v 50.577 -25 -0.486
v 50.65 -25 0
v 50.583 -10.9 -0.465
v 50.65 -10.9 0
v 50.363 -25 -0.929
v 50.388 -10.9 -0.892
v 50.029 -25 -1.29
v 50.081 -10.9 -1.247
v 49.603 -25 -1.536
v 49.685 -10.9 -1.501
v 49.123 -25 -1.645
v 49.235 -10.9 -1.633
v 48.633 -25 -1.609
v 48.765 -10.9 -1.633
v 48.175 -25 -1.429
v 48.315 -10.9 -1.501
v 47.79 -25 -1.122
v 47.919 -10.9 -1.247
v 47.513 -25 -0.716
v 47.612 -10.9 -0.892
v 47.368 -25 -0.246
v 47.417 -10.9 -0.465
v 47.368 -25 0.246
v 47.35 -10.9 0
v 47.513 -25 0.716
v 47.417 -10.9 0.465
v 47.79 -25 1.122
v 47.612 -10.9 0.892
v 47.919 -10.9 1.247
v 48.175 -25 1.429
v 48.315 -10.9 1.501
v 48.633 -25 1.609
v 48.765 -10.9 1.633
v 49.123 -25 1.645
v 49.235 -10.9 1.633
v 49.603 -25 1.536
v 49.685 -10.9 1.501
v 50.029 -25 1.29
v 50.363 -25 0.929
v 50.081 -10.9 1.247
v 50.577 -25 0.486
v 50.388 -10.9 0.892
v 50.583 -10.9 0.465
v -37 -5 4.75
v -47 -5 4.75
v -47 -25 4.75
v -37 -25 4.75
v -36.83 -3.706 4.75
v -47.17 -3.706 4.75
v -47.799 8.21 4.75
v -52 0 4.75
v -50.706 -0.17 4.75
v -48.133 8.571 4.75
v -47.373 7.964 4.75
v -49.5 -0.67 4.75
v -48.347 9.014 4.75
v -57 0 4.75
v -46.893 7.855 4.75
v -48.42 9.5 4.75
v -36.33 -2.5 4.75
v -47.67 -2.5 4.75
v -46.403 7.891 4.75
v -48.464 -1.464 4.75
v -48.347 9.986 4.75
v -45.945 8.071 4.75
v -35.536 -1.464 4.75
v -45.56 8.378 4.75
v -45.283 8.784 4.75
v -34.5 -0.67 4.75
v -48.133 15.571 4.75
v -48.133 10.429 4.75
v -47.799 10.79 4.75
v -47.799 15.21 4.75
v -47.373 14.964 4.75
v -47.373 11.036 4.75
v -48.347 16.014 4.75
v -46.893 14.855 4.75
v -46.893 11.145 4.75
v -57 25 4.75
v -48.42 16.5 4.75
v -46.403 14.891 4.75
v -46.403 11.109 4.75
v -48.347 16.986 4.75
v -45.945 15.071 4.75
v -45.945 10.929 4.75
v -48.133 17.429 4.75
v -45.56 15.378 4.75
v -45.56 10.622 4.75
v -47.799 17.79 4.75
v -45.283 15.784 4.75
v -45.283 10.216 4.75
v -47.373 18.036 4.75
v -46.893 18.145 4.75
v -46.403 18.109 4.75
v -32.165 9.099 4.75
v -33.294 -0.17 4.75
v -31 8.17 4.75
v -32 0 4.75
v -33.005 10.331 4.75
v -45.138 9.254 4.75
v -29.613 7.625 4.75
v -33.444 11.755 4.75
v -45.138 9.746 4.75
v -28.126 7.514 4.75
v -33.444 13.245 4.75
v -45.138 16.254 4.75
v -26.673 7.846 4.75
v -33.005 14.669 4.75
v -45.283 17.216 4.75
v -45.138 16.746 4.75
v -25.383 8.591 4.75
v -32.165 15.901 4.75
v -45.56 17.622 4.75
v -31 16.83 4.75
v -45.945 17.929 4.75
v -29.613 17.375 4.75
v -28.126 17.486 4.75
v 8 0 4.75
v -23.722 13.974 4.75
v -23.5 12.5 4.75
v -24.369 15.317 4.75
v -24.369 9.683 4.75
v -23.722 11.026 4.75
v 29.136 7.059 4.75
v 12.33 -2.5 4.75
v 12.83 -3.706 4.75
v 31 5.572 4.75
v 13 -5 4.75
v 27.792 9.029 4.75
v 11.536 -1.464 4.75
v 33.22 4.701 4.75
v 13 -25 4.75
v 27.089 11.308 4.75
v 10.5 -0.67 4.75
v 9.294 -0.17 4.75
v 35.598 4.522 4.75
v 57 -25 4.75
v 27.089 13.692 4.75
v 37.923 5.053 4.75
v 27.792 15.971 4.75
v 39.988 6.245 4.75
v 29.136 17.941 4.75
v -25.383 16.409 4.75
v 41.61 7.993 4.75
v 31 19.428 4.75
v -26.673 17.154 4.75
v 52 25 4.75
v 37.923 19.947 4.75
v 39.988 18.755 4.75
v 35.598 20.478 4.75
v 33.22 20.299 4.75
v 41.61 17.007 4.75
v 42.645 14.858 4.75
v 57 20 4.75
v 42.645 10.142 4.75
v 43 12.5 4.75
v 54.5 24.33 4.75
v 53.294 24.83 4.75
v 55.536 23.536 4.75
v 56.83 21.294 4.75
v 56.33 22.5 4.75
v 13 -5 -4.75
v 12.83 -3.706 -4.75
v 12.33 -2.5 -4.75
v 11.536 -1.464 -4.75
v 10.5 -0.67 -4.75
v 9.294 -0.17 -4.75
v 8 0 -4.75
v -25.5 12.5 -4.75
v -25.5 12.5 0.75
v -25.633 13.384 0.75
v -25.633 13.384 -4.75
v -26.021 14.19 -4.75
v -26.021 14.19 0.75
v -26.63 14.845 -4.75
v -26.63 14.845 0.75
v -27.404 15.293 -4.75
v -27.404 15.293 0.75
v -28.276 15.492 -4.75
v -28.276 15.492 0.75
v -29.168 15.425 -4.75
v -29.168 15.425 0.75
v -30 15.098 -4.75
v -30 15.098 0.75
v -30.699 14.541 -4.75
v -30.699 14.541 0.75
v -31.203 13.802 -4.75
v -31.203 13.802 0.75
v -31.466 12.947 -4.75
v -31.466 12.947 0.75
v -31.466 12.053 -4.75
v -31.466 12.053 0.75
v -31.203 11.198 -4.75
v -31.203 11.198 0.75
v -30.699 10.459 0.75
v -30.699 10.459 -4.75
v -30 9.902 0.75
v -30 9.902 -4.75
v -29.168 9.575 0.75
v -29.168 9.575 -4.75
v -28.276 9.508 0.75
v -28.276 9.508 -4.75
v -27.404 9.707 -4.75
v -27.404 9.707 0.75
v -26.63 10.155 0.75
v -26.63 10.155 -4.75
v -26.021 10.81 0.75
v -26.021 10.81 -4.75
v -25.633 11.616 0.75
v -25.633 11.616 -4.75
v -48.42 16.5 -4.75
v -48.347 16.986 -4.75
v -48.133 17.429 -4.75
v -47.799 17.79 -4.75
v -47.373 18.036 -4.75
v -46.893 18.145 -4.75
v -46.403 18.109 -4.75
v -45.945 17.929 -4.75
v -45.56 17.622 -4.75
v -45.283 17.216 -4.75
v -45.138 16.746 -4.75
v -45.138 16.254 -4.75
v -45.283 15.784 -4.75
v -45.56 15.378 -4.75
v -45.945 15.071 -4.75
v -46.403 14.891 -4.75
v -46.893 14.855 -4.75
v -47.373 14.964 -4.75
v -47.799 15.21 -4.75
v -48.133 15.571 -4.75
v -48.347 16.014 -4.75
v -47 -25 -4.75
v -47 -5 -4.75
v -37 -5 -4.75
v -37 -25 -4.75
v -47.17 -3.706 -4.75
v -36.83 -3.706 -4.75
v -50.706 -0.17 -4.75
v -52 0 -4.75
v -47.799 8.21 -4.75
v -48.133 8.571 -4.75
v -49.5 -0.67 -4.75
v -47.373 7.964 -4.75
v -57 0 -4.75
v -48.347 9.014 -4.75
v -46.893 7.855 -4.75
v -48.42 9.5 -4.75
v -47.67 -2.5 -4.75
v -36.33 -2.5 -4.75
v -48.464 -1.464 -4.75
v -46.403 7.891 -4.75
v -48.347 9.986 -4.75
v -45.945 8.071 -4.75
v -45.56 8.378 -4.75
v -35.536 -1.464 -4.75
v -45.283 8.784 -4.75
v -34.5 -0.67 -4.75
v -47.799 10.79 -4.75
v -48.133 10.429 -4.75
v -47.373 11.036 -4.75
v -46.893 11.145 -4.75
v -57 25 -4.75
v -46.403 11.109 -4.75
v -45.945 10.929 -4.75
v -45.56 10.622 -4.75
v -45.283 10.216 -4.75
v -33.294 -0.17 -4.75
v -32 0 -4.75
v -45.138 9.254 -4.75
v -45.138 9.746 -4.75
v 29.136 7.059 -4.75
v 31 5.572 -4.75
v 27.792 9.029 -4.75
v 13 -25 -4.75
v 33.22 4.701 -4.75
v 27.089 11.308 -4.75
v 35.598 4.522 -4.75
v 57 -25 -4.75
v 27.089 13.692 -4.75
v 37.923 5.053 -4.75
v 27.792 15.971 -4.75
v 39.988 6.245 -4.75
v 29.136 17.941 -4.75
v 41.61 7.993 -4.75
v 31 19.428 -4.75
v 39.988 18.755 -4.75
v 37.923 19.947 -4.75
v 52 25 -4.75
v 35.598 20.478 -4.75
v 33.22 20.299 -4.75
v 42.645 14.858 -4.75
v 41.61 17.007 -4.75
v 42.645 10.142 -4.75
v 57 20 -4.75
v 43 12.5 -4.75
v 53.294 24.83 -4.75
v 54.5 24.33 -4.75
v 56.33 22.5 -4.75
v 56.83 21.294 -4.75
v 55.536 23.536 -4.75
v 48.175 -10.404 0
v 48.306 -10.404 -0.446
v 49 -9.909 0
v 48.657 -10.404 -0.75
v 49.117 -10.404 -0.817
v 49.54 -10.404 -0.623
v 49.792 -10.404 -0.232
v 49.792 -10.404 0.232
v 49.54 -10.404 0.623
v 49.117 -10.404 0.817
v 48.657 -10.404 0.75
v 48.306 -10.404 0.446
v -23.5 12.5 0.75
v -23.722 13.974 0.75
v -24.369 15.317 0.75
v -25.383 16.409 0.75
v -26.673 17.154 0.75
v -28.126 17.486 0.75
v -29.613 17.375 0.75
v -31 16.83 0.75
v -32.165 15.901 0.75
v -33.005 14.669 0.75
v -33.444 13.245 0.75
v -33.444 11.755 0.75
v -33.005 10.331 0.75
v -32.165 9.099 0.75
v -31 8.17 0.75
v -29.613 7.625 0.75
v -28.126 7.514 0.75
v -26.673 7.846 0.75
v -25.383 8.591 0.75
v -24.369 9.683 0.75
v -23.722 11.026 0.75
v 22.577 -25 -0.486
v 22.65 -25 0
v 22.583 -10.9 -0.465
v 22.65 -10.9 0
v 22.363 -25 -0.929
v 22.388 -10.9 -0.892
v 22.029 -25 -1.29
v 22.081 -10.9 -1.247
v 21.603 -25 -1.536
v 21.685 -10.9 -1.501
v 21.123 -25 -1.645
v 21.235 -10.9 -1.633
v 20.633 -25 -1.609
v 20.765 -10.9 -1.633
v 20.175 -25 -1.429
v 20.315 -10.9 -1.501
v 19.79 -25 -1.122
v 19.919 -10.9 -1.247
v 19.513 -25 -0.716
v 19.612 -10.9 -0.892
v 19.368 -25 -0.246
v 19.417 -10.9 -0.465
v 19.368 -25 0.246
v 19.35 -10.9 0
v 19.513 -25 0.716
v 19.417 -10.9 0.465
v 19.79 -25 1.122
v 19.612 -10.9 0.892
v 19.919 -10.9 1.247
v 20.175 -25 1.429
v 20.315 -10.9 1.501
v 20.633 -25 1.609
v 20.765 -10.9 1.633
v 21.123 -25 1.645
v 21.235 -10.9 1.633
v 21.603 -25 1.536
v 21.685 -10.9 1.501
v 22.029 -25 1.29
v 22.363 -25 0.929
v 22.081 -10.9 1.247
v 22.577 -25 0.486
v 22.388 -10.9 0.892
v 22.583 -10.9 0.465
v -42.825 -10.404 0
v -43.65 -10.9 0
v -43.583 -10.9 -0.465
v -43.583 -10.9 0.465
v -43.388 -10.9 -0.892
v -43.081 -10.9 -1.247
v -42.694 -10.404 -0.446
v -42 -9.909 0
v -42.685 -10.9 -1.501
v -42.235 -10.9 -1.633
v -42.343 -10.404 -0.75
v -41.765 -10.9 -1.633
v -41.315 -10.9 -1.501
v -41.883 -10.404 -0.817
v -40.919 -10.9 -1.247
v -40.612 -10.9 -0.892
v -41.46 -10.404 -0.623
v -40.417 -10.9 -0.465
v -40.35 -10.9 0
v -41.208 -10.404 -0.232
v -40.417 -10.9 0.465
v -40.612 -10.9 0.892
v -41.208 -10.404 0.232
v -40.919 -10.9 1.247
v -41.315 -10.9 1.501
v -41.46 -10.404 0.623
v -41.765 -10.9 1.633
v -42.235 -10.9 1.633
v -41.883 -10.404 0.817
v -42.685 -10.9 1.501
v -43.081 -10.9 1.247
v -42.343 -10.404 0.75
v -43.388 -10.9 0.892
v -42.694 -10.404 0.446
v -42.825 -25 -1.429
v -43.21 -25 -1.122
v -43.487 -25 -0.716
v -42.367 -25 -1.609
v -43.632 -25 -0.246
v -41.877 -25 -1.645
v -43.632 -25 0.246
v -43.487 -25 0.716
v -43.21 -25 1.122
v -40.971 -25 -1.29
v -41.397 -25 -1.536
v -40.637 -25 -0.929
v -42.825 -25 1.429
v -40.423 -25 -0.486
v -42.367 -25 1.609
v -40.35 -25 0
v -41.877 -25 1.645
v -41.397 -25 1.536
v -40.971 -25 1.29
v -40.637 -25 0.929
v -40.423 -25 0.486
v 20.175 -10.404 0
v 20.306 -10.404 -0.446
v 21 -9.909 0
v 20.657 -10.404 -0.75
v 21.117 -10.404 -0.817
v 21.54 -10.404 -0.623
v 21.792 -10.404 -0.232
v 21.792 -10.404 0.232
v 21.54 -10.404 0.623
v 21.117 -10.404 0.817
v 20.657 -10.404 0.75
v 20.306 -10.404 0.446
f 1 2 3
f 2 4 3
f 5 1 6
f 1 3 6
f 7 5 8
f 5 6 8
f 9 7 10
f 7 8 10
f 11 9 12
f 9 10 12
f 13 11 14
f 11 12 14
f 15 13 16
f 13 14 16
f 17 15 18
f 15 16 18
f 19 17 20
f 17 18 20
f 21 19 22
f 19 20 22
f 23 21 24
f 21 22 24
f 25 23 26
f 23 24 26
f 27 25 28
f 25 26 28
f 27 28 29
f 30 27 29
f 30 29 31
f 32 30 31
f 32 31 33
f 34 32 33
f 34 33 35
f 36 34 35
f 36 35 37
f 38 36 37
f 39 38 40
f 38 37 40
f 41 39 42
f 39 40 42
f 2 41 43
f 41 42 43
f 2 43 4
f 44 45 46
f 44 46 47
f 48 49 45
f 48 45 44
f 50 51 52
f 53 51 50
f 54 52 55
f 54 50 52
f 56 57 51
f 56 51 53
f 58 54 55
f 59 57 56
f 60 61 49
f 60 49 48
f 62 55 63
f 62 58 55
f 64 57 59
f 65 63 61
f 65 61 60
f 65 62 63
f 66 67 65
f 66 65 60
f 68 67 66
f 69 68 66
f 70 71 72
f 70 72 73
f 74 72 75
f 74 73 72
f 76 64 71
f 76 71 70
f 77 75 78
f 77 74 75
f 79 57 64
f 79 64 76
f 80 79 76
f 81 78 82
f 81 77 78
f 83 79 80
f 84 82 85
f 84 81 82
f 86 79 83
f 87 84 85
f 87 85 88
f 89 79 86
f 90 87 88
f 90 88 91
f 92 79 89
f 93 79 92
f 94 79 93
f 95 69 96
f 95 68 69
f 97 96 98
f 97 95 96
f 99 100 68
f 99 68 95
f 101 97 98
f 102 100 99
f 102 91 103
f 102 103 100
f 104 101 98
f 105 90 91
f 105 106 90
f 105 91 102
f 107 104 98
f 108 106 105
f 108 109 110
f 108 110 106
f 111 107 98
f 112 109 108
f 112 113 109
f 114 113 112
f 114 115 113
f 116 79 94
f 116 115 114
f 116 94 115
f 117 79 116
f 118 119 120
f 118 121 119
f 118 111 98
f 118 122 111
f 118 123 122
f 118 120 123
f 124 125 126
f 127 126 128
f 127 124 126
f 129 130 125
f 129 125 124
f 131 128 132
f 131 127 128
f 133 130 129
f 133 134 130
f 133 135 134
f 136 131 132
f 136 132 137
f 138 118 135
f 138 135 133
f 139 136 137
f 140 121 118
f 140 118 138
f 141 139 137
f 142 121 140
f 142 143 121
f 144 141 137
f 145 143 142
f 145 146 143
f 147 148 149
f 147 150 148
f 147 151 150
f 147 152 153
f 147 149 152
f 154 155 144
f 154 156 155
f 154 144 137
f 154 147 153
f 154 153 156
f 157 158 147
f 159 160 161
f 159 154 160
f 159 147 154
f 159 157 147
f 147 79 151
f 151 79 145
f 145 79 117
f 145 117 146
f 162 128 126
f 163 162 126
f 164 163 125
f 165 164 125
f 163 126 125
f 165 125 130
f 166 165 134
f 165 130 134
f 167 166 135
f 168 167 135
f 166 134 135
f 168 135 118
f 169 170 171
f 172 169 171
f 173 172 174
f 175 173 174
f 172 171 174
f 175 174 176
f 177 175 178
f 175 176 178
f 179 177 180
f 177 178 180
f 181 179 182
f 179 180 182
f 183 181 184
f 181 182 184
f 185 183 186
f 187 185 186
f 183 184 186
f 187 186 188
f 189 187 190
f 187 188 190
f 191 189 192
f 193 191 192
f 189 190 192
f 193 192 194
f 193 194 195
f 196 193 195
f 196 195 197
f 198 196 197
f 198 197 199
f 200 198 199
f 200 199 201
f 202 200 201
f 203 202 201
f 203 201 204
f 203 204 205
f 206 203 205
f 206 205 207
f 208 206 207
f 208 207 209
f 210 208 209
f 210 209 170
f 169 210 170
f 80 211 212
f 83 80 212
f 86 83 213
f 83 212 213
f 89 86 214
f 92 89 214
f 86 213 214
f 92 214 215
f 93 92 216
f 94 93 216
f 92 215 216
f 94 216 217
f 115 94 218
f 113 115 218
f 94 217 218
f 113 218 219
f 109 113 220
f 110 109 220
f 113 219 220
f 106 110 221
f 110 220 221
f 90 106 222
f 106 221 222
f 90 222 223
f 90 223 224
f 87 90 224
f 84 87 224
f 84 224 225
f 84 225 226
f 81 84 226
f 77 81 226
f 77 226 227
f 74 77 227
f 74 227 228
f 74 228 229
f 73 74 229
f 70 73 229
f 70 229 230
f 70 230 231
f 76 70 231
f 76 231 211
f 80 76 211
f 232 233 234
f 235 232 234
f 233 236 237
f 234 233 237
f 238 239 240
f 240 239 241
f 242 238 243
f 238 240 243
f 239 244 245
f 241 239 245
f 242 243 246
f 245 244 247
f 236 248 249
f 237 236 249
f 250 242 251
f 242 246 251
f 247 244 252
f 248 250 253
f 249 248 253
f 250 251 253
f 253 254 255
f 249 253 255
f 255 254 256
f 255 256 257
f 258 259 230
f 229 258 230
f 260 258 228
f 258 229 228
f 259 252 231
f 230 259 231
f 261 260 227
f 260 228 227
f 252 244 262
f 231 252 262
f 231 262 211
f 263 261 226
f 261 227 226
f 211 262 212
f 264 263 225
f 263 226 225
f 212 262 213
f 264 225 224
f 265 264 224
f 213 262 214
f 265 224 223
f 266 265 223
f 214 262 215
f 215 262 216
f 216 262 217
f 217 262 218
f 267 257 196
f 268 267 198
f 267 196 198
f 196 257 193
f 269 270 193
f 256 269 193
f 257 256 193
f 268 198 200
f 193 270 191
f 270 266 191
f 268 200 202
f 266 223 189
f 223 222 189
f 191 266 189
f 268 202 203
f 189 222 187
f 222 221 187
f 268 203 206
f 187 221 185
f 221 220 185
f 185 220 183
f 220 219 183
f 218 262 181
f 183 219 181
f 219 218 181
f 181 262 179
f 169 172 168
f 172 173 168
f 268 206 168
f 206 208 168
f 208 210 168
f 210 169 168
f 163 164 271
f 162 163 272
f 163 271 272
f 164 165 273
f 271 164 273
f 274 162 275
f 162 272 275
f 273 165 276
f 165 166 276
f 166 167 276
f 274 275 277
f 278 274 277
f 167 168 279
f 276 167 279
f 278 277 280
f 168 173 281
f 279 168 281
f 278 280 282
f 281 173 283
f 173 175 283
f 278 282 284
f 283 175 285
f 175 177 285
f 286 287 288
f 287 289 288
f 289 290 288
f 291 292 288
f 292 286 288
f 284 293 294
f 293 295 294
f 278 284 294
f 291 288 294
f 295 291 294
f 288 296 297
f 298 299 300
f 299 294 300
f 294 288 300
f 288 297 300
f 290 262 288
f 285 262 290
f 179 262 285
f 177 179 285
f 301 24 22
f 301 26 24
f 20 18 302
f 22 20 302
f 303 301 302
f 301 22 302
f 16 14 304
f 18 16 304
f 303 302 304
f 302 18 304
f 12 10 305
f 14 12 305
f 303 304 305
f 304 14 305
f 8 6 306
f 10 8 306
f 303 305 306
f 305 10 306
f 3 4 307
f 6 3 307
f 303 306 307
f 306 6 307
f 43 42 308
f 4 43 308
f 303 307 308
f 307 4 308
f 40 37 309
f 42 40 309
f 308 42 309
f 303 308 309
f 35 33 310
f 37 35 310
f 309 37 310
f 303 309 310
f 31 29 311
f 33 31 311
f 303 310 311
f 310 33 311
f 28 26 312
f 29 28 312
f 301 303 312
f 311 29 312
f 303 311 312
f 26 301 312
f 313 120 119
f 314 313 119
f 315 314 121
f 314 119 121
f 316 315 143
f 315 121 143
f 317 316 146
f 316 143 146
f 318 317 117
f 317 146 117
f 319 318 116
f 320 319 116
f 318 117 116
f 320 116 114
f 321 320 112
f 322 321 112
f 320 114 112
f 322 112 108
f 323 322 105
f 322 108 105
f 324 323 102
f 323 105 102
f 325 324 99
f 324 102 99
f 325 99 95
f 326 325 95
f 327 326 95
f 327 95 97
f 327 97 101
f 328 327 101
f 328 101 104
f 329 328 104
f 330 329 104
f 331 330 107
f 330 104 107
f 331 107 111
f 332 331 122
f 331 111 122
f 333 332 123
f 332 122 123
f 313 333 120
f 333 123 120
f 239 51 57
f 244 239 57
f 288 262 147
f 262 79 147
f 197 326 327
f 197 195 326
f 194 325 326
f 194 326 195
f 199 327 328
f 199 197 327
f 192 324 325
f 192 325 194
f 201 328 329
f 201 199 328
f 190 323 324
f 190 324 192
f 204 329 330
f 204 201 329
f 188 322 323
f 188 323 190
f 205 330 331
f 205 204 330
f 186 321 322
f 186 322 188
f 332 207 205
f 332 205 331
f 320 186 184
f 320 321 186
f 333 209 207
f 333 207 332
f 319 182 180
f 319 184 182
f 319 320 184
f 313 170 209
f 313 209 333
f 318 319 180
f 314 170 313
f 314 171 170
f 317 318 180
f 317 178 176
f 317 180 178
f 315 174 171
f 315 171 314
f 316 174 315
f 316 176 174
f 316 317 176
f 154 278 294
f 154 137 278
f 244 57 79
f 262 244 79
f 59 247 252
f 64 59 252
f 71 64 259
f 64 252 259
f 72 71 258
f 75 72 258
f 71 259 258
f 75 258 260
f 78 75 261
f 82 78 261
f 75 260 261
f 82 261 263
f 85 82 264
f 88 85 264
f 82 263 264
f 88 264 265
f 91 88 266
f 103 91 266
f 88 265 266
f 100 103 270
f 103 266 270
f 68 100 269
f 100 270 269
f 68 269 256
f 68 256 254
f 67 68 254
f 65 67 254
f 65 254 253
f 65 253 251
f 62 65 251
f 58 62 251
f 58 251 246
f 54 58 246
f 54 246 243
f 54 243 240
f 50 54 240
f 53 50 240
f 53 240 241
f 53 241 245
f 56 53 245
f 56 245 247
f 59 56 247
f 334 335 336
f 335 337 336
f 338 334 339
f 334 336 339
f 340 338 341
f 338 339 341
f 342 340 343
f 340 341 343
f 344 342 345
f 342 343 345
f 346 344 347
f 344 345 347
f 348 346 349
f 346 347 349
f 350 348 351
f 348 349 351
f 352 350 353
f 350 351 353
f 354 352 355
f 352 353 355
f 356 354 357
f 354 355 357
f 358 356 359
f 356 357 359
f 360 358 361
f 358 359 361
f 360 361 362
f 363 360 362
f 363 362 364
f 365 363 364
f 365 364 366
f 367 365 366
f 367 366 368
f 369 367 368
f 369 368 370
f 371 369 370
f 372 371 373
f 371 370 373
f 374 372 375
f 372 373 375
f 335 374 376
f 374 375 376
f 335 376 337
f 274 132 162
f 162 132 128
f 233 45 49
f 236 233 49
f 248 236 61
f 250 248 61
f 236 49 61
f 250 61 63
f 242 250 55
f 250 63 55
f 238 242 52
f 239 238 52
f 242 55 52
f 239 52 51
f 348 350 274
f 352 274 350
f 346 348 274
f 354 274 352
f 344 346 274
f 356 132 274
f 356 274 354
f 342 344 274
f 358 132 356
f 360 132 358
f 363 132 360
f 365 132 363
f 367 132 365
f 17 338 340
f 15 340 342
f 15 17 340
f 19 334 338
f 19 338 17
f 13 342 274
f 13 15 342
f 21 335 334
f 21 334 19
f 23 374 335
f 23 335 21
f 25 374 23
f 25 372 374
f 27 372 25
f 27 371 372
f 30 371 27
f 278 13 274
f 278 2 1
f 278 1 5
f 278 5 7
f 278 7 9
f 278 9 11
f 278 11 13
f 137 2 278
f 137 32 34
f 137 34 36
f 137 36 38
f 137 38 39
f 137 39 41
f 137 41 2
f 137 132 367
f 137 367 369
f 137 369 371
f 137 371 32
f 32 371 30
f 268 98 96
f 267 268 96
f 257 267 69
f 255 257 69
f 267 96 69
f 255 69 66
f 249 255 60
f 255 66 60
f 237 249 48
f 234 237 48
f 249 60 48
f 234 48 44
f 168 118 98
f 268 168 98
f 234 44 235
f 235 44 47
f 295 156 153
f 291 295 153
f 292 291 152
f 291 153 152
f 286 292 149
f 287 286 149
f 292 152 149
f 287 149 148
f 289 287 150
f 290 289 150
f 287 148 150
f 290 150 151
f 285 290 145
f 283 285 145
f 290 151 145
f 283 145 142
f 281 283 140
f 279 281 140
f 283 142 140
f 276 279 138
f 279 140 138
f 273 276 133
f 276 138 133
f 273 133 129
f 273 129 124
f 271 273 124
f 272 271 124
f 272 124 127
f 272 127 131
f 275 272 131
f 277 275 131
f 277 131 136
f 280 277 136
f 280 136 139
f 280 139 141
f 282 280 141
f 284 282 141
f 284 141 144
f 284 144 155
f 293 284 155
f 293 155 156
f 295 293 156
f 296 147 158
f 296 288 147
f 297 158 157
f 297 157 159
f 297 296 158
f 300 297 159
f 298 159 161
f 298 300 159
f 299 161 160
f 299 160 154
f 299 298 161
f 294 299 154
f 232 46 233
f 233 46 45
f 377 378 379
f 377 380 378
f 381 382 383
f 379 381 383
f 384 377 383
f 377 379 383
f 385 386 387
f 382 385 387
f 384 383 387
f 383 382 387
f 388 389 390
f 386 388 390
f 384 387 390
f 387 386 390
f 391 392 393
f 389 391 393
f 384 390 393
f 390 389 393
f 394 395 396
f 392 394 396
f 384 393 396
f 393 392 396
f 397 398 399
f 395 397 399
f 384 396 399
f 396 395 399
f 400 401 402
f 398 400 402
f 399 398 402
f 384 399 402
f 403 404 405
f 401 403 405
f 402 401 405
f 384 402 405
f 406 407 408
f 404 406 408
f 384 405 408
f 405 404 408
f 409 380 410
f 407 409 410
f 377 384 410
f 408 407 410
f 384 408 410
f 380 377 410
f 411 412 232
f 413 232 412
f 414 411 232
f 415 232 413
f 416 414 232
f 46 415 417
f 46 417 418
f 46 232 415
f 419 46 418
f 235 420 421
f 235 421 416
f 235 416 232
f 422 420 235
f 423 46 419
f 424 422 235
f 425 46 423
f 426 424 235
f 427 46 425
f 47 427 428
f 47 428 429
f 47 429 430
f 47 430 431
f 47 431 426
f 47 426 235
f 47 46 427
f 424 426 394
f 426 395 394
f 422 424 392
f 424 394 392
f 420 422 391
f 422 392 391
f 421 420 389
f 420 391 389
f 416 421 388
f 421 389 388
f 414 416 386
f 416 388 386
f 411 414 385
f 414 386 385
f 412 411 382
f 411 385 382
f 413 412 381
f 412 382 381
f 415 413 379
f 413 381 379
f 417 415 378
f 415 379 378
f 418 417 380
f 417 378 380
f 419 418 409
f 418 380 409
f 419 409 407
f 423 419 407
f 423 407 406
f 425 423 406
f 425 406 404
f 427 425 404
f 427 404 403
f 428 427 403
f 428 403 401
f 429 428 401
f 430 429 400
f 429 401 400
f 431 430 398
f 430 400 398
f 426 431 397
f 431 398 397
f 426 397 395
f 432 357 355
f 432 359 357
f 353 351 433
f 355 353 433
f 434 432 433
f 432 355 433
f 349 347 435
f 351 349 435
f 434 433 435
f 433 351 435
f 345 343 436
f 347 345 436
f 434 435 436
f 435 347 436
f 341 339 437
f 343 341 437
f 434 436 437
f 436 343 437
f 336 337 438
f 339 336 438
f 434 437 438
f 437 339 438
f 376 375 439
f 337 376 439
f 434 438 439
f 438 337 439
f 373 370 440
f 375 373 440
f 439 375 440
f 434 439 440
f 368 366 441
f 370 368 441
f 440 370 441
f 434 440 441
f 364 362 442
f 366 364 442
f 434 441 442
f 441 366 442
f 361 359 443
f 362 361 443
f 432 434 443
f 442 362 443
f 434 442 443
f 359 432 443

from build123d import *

# Parameters (mm, degrees)
SKETCH1_W             = 114
SKETCH1_H             = 50
BOSS_EXTRUDE1_DEPTH   = 4.75
SKETCH2_R             = 8
CUT_EXTRUDE1_DEPTH    = 63.962290301
FILLET1_R             = 5
SKETCH3_R             = 5
CUT_EXTRUDE2_DEPTH    = 4
SKETCH4_R             = 3
CUT_EXTRUDE3_DEPTH    = 63.483997951
M4_TAPPED_HOLE1_D     = 3.3
M4_TAPPED_HOLE2_D     = 3.3
M4_TAPPED_HOLE2_DEPTH = 14.1
M4_TAPPED_HOLE2_TIP   = 0.991420021


with BuildPart() as part:
    # Sketch1 → Boss-Extrude1 (new, symmetric)
    with BuildSketch(Plane.XY):
        Rectangle(SKETCH1_W, SKETCH1_H)
    extrude(amount=BOSS_EXTRUDE1_DEPTH, both=True)

    # Sketch2 → Cut-Extrude1 (cut, through all)
    with BuildSketch(Plane.XY.offset(4.75)):
        with BuildLine():
            Line((-37, -5), (-37, -25))
            Line((-37, -25), (13, -25))
            Line((13, -25), (13, -5))
            ThreePointArc((13, -5), (11.535533906, -1.464466094), (8, 0))
            Line((8, 0), (-32, 0))
            ThreePointArc((-32, 0), (-35.535533906, -1.464466094), (-37, -5))
        make_face()
        with BuildLine():
            Line((-57, -25), (-47, -25))
            Line((-47, -25), (-47, -5))
            ThreePointArc((-47, -5), (-48.464466094, -1.464466094), (-52, 0))
            Line((-52, 0), (-57, 0))
            Line((-57, 0), (-57, -25))
        make_face()
        with Locations((35, 12.5)):
            Circle(SKETCH2_R)
    extrude(amount=-CUT_EXTRUDE1_DEPTH, mode=Mode.SUBTRACT)

    # Fillet1
    fillet1_edges = [part.edges().sort_by_distance(p)[0] for p in [
        (57, 25, 0),
    ]]
    fillet(fillet1_edges, radius=FILLET1_R)

    # Sketch3 → Cut-Extrude2 (cut)
    with BuildSketch(Plane.XY.offset(4.75)):
        with Locations((-28.5, 12.5)):
            Circle(SKETCH3_R)
    extrude(amount=-CUT_EXTRUDE2_DEPTH, mode=Mode.SUBTRACT)

    # Sketch4 → Cut-Extrude3 (cut, through all)
    with BuildSketch(Plane.XY.offset(0.75)):
        with Locations((-28.5, 12.5)):
            Circle(SKETCH4_R)
    extrude(amount=-CUT_EXTRUDE3_DEPTH, mode=Mode.SUBTRACT)

    # M4 Tapped Hole1 (through all)
    with Locations(Plane.XY.offset(4.75)):
        with Locations((-46.77, 9.5), (-46.77, 16.5)):
            Hole(M4_TAPPED_HOLE1_D / 2)

    # M4 Tapped Hole2
    with Locations(Plane(origin=(0, -25, 0), x_dir=(-1, 0, 0), z_dir=(0, -1, 0))):
        with Locations((42, 0), (-21, 0), (-49, 0)):
            Hole(M4_TAPPED_HOLE2_D / 2, depth=M4_TAPPED_HOLE2_DEPTH)
            with Locations((0, 0, -(M4_TAPPED_HOLE2_DEPTH + M4_TAPPED_HOLE2_TIP / 2))):  # 118° drill point
                Cone(0, M4_TAPPED_HOLE2_D / 2, M4_TAPPED_HOLE2_TIP, mode=Mode.SUBTRACT)


solid = part.part
